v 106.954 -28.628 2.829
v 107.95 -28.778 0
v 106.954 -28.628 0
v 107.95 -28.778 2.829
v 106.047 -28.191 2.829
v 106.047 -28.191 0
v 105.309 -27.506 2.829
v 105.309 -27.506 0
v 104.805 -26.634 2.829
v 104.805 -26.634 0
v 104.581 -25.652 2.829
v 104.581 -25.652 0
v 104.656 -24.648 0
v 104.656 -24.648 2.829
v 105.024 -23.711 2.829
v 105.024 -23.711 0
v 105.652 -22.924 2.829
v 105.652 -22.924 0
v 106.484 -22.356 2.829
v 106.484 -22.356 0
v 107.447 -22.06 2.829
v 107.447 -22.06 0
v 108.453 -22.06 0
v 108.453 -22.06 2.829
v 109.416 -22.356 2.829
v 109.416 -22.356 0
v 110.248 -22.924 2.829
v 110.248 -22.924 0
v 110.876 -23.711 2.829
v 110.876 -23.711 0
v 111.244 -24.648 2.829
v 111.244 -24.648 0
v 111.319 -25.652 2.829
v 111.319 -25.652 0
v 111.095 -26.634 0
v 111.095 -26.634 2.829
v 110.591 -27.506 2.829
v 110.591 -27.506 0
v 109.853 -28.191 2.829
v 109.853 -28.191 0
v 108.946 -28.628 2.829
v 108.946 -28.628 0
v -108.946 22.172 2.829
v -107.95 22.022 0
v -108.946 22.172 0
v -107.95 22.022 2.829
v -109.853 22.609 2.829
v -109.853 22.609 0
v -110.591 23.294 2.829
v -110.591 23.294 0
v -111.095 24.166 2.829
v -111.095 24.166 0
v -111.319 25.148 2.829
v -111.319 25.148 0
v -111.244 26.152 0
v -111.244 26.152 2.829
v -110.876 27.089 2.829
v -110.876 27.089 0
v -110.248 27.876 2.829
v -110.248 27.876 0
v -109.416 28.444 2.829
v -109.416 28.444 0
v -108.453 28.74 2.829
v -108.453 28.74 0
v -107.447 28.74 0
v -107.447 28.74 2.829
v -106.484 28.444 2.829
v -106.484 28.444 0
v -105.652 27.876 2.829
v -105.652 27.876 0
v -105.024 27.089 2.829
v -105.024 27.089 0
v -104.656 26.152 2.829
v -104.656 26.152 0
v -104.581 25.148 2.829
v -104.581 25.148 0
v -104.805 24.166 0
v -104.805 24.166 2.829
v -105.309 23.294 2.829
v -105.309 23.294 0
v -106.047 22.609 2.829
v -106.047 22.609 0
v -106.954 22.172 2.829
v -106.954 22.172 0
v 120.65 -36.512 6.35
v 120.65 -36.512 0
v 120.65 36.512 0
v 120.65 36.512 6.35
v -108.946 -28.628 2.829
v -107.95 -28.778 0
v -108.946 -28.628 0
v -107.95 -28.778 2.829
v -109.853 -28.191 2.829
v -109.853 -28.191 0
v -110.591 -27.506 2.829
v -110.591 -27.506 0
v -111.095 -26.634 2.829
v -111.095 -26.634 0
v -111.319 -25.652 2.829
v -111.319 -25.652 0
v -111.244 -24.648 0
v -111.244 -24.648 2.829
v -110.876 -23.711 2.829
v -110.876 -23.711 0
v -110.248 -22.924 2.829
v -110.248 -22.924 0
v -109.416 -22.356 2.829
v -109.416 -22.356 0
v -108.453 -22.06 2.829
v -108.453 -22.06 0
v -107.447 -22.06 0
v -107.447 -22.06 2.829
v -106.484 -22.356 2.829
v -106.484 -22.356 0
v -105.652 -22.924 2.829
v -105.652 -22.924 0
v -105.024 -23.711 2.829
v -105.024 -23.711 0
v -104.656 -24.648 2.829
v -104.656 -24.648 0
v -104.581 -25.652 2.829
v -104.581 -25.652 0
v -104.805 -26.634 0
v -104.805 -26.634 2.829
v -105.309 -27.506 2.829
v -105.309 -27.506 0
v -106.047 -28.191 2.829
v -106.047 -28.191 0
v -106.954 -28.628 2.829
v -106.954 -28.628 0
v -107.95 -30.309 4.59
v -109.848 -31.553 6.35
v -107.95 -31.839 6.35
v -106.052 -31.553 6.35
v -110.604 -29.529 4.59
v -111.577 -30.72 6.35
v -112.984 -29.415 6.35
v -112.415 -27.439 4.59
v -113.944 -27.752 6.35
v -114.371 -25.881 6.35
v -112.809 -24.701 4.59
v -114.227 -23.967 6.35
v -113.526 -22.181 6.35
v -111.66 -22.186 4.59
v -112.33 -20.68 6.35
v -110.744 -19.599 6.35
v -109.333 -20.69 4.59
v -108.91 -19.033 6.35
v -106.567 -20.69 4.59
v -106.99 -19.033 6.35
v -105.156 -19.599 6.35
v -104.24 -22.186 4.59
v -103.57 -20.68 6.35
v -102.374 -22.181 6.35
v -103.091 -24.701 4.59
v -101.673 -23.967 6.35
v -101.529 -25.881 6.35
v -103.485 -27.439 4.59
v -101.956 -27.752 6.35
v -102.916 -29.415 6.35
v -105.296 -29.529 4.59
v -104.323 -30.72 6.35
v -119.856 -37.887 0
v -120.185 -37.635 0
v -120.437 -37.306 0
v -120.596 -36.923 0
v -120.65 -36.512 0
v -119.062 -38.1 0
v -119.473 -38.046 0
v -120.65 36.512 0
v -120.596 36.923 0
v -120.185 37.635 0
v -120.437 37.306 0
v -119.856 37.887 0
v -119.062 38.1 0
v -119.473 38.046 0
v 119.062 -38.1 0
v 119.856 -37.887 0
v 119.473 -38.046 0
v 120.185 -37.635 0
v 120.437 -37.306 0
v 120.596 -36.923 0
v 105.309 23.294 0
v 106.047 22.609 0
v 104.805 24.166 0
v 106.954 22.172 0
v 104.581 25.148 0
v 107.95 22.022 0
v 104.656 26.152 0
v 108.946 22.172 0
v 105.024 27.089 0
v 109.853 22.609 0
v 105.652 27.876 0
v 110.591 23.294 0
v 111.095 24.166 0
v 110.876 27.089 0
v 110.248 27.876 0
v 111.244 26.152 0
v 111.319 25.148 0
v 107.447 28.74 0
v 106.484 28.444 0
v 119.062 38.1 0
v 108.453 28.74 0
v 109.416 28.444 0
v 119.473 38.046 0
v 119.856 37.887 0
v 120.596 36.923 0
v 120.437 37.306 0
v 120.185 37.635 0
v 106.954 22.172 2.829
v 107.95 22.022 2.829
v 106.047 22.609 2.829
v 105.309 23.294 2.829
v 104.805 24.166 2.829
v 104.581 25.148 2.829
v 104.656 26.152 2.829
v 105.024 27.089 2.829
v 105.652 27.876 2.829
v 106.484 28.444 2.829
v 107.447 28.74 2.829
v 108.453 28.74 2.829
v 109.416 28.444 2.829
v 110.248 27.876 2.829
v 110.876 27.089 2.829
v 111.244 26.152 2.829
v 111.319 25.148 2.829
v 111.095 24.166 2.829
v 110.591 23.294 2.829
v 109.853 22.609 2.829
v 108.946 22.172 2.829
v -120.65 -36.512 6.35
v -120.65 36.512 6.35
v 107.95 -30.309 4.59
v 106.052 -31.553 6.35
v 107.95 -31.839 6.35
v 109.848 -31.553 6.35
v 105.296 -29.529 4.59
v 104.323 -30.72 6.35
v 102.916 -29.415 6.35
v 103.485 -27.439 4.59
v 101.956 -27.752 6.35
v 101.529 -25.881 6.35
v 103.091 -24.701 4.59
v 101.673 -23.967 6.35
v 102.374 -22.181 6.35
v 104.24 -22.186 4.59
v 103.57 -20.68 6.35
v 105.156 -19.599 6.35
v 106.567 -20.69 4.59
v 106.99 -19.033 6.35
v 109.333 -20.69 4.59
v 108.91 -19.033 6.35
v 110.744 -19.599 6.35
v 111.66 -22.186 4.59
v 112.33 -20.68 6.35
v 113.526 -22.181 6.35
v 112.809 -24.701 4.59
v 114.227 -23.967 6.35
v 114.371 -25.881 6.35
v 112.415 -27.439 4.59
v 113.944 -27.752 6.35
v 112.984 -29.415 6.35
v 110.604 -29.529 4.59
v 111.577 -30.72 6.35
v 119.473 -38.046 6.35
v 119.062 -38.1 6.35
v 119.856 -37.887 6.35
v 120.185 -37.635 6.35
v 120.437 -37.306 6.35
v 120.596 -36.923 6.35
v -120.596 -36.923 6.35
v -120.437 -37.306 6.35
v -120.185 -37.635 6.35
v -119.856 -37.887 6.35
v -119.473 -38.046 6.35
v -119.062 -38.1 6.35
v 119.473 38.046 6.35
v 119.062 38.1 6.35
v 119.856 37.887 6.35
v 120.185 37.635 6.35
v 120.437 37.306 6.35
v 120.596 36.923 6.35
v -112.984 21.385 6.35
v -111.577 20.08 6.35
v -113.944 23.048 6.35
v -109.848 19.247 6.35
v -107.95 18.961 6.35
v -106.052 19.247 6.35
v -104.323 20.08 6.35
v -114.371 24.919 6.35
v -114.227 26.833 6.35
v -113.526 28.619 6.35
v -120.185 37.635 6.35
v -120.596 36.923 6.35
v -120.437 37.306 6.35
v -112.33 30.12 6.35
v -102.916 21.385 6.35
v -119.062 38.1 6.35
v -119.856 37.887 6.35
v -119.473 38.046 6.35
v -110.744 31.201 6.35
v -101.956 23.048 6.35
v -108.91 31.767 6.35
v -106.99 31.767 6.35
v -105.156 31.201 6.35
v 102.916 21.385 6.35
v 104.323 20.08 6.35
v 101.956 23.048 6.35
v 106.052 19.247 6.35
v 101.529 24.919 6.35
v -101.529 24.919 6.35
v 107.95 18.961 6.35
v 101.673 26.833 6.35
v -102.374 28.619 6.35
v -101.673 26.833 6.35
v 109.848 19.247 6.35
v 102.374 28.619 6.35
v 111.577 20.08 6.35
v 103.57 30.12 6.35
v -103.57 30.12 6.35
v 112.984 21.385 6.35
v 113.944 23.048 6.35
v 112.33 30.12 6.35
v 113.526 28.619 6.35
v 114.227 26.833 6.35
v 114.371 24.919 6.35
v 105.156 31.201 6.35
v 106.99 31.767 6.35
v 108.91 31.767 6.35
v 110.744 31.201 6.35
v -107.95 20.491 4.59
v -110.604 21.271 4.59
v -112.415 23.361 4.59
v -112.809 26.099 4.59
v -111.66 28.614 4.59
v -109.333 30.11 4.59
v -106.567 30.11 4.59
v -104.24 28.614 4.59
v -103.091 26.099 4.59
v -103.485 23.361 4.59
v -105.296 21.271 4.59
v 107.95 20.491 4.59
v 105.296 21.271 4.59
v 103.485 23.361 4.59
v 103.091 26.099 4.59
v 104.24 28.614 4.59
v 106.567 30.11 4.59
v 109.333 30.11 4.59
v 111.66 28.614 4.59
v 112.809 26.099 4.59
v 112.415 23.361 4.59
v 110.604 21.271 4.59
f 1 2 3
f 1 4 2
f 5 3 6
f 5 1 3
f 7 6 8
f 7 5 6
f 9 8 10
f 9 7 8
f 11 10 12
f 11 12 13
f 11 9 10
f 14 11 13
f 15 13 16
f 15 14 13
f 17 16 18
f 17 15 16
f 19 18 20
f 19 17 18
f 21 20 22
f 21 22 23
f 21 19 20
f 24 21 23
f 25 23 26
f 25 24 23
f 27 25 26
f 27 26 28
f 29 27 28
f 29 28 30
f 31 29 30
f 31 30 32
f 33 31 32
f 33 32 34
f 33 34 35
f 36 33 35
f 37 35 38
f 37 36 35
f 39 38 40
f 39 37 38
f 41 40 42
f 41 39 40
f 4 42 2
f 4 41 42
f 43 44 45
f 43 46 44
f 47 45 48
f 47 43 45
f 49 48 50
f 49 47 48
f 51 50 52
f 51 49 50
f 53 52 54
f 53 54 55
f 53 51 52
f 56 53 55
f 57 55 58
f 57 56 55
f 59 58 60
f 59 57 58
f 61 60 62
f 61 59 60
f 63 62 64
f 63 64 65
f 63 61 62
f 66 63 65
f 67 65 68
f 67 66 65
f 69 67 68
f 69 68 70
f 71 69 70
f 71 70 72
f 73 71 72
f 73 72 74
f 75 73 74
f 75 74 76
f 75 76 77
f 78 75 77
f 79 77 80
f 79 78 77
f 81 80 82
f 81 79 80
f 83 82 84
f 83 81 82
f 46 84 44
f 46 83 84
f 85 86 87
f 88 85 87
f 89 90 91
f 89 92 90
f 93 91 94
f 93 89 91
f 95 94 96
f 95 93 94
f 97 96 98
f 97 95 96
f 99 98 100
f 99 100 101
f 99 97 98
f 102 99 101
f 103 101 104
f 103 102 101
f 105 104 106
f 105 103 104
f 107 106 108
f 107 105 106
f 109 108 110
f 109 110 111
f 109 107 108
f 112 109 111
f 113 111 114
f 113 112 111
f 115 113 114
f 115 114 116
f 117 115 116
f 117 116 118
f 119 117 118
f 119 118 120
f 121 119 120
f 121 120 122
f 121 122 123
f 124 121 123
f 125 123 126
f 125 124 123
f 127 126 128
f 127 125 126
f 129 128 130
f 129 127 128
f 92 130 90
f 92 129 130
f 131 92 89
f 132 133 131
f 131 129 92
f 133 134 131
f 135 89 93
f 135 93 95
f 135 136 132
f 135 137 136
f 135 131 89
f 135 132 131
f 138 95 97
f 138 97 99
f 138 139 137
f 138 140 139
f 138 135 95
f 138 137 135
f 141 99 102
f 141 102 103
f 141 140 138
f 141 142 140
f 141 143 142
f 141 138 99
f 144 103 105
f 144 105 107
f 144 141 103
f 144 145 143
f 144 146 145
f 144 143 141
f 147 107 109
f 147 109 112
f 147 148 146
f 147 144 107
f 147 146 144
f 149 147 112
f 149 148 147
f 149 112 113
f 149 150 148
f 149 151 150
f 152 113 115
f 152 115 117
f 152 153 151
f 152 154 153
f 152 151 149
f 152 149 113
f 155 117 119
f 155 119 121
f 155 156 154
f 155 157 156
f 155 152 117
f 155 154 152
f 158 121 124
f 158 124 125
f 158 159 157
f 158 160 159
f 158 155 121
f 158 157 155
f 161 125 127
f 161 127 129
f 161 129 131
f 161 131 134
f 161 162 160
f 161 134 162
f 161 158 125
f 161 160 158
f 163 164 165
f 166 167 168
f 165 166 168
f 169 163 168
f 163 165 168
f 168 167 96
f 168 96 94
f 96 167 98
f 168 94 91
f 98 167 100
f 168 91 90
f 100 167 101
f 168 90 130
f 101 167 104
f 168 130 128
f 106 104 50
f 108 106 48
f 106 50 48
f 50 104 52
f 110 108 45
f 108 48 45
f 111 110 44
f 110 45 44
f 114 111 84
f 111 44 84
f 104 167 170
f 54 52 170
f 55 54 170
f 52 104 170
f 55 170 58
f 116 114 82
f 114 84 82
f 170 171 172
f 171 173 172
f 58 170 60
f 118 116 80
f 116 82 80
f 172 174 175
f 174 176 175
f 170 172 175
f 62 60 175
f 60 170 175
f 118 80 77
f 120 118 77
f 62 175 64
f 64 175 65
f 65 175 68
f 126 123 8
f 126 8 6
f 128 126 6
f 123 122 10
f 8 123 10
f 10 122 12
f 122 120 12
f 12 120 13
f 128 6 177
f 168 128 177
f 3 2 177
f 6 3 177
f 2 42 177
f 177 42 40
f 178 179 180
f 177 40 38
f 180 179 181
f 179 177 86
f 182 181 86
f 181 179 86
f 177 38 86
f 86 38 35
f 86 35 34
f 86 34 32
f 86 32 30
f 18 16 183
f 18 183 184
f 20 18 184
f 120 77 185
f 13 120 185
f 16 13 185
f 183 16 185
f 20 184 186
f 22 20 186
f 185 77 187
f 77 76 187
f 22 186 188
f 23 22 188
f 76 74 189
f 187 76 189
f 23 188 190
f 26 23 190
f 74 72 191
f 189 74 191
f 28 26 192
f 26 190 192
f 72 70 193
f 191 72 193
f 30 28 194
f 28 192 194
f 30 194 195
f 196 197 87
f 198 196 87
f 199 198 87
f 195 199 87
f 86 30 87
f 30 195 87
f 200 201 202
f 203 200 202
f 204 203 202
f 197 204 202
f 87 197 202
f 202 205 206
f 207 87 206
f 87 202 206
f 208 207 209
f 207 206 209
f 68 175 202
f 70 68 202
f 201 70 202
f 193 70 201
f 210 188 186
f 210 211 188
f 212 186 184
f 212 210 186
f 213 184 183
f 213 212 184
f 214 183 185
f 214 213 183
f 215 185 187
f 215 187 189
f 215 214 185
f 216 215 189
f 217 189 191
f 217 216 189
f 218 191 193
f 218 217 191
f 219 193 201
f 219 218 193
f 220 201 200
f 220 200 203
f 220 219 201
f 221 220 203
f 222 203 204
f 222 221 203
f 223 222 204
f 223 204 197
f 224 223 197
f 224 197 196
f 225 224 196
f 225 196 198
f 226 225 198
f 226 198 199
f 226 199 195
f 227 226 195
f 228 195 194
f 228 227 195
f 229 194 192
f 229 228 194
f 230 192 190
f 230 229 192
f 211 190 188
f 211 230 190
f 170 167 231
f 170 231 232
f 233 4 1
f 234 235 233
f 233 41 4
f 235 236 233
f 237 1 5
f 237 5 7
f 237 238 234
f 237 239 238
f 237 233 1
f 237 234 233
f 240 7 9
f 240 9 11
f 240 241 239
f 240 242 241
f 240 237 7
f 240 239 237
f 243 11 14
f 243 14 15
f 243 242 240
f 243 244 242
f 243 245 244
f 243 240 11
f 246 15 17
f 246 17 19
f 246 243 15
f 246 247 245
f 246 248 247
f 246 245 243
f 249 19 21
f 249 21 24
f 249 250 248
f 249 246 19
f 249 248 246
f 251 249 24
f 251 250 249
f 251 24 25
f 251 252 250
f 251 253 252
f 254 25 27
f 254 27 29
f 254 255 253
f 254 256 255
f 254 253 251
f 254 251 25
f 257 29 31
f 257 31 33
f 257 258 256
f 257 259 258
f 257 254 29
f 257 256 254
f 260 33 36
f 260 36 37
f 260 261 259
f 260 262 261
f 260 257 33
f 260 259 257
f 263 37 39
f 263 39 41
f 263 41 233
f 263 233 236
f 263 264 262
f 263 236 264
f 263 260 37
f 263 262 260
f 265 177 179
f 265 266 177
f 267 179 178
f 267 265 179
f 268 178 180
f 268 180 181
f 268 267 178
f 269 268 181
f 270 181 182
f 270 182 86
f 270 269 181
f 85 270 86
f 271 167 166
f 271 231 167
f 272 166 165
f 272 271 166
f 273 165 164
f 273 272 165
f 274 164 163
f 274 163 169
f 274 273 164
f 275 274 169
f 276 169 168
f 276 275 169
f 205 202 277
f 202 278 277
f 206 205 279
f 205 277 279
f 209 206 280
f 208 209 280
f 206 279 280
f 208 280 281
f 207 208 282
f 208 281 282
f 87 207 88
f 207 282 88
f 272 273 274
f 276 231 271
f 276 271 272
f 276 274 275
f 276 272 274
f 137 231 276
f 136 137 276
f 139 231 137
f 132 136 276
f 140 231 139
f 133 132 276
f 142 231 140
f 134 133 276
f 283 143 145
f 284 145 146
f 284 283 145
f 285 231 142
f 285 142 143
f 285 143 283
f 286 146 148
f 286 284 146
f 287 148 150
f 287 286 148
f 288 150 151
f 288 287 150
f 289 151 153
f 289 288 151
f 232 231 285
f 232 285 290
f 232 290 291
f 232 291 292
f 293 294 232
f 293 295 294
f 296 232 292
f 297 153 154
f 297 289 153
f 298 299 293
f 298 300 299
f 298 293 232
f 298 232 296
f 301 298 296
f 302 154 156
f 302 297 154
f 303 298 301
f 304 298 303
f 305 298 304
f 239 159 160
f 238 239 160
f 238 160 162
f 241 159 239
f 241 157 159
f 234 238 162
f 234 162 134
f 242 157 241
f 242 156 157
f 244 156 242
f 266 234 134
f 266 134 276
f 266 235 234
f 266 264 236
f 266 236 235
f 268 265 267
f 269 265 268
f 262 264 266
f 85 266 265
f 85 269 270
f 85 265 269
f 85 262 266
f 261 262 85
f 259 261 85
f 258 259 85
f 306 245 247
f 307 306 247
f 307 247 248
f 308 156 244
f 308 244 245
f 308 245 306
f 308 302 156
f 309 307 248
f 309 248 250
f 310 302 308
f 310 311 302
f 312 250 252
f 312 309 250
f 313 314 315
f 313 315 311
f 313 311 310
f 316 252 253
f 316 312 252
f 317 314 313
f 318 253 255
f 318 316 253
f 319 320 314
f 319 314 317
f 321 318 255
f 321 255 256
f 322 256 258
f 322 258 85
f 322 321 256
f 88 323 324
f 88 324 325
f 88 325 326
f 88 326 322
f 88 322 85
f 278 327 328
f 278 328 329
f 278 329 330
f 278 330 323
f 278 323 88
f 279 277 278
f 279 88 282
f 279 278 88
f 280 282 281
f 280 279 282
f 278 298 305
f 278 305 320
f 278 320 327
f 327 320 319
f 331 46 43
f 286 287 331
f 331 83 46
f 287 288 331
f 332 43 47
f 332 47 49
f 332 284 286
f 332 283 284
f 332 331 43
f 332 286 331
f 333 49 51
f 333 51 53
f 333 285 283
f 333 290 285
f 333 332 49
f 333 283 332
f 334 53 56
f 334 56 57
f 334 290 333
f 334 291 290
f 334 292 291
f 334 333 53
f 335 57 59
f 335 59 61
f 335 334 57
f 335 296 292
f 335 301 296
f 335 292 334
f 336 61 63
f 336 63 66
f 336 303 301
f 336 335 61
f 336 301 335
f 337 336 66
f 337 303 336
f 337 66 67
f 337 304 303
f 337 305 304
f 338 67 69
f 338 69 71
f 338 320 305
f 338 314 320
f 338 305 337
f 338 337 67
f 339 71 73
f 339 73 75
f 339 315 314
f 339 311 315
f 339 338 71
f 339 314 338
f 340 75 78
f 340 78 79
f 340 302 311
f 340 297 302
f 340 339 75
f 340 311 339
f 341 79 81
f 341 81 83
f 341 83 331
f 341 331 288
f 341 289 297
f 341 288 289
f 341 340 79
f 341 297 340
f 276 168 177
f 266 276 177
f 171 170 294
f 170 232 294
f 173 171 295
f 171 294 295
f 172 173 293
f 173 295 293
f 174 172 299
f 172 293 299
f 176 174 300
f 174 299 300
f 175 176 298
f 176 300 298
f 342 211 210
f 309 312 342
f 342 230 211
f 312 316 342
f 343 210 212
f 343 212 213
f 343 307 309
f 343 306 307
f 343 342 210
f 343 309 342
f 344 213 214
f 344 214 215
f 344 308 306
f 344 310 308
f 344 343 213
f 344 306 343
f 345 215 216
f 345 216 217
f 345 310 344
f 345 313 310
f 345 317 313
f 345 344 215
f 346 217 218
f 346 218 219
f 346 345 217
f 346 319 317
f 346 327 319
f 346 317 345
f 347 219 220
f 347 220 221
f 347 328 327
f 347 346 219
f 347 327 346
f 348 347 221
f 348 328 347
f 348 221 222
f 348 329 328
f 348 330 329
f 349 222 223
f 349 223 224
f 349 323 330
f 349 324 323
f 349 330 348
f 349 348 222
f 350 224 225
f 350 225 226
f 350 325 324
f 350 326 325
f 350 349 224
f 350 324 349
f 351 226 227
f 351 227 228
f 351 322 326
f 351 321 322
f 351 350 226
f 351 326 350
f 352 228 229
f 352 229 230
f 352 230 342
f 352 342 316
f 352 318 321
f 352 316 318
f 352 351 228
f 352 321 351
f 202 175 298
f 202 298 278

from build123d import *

# Parameters (mm, degrees)
SKETCH1_W                                   = 241.3
SKETCH1_H                                   = 76.2
BOSS_EXTRUDE1_DEPTH                         = 6.35
CSK_FOR_1_4_FLAT_HEAD_MACHINE_SCREW_2_COUNT = 2
CSK_FOR_1_4_FLAT_HEAD_MACHINE_SCREW_2_PITCH = 50.8
CSK_FOR_1_4_FLAT_HEAD_MACHINE_SCREW_3_COUNT = 2
CSK_FOR_1_4_FLAT_HEAD_MACHINE_SCREW_3_PITCH = 215.9
CSK_FOR_1_4_FLAT_HEAD_MACHINE_SCREW_4_COUNT = 2
CSK_FOR_1_4_FLAT_HEAD_MACHINE_SCREW_4_PITCH = 221.795964796
FILLET1_R                                   = 1.5875


with BuildPart() as part:
    # Sketch1 → Boss-Extrude1 (new body)
    with BuildSketch(Plane.XY):
        Rectangle(SKETCH1_W, SKETCH1_H)
    extrude(amount=BOSS_EXTRUDE1_DEPTH)

    # Sketch4 → CSK for 1/4 Flat Head Machine Screw (100)1 (revolve, cut)
    with BuildSketch(Plane(origin=(107.95, 25.4, 6.35), x_dir=(0, -1, 0), z_dir=(1, 0, 0))):
        Polygon((0, 0), (0, 6.35), (3.3782, 6.35), (3.3782, 3.520932584), (6.4389, 0), align=None)
    csk_for_1_4_flat_head_machine_screw_100 = revolve(axis=Axis((107.95, 25.4, 12.7), (0, 0, -1)), mode=Mode.SUBTRACT)

    # CSK for 1_4 Flat Head Machine Screw  2: CSK for 1/4 Flat Head Machine Screw (100)1 ×2
    with Locations(*[(0, -i * CSK_FOR_1_4_FLAT_HEAD_MACHINE_SCREW_2_PITCH, 0) for i in range(1, CSK_FOR_1_4_FLAT_HEAD_MACHINE_SCREW_2_COUNT)]):
        add(csk_for_1_4_flat_head_machine_screw_100, mode=Mode.SUBTRACT)

    # CSK for 1_4 Flat Head Machine Screw  3: CSK for 1/4 Flat Head Machine Screw (100)1 ×2
    with Locations(*[(-i * CSK_FOR_1_4_FLAT_HEAD_MACHINE_SCREW_3_PITCH, 0, 0) for i in range(1, CSK_FOR_1_4_FLAT_HEAD_MACHINE_SCREW_3_COUNT)]):
        add(csk_for_1_4_flat_head_machine_screw_100, mode=Mode.SUBTRACT)

    # CSK for 1_4 Flat Head Machine Screw  4: CSK for 1/4 Flat Head Machine Screw (100)1 ×2
    with Locations(*[Vector(-0.973417168, -0.229039334, 0) * (i * CSK_FOR_1_4_FLAT_HEAD_MACHINE_SCREW_4_PITCH) for i in range(1, CSK_FOR_1_4_FLAT_HEAD_MACHINE_SCREW_4_COUNT)]):
        add(csk_for_1_4_flat_head_machine_screw_100, mode=Mode.SUBTRACT)

    # Fillet1
    fillet1_edges = [part.edges().sort_by_distance(p)[0] for p in [
        (120.65, -38.1, 3.175),
        (-120.65, -38.1, 3.175),
        (-120.65, 38.1, 3.175),
        (120.65, 38.1, 3.175),
    ]]
    fillet(fillet1_edges, radius=FILLET1_R)


solid = part.part
